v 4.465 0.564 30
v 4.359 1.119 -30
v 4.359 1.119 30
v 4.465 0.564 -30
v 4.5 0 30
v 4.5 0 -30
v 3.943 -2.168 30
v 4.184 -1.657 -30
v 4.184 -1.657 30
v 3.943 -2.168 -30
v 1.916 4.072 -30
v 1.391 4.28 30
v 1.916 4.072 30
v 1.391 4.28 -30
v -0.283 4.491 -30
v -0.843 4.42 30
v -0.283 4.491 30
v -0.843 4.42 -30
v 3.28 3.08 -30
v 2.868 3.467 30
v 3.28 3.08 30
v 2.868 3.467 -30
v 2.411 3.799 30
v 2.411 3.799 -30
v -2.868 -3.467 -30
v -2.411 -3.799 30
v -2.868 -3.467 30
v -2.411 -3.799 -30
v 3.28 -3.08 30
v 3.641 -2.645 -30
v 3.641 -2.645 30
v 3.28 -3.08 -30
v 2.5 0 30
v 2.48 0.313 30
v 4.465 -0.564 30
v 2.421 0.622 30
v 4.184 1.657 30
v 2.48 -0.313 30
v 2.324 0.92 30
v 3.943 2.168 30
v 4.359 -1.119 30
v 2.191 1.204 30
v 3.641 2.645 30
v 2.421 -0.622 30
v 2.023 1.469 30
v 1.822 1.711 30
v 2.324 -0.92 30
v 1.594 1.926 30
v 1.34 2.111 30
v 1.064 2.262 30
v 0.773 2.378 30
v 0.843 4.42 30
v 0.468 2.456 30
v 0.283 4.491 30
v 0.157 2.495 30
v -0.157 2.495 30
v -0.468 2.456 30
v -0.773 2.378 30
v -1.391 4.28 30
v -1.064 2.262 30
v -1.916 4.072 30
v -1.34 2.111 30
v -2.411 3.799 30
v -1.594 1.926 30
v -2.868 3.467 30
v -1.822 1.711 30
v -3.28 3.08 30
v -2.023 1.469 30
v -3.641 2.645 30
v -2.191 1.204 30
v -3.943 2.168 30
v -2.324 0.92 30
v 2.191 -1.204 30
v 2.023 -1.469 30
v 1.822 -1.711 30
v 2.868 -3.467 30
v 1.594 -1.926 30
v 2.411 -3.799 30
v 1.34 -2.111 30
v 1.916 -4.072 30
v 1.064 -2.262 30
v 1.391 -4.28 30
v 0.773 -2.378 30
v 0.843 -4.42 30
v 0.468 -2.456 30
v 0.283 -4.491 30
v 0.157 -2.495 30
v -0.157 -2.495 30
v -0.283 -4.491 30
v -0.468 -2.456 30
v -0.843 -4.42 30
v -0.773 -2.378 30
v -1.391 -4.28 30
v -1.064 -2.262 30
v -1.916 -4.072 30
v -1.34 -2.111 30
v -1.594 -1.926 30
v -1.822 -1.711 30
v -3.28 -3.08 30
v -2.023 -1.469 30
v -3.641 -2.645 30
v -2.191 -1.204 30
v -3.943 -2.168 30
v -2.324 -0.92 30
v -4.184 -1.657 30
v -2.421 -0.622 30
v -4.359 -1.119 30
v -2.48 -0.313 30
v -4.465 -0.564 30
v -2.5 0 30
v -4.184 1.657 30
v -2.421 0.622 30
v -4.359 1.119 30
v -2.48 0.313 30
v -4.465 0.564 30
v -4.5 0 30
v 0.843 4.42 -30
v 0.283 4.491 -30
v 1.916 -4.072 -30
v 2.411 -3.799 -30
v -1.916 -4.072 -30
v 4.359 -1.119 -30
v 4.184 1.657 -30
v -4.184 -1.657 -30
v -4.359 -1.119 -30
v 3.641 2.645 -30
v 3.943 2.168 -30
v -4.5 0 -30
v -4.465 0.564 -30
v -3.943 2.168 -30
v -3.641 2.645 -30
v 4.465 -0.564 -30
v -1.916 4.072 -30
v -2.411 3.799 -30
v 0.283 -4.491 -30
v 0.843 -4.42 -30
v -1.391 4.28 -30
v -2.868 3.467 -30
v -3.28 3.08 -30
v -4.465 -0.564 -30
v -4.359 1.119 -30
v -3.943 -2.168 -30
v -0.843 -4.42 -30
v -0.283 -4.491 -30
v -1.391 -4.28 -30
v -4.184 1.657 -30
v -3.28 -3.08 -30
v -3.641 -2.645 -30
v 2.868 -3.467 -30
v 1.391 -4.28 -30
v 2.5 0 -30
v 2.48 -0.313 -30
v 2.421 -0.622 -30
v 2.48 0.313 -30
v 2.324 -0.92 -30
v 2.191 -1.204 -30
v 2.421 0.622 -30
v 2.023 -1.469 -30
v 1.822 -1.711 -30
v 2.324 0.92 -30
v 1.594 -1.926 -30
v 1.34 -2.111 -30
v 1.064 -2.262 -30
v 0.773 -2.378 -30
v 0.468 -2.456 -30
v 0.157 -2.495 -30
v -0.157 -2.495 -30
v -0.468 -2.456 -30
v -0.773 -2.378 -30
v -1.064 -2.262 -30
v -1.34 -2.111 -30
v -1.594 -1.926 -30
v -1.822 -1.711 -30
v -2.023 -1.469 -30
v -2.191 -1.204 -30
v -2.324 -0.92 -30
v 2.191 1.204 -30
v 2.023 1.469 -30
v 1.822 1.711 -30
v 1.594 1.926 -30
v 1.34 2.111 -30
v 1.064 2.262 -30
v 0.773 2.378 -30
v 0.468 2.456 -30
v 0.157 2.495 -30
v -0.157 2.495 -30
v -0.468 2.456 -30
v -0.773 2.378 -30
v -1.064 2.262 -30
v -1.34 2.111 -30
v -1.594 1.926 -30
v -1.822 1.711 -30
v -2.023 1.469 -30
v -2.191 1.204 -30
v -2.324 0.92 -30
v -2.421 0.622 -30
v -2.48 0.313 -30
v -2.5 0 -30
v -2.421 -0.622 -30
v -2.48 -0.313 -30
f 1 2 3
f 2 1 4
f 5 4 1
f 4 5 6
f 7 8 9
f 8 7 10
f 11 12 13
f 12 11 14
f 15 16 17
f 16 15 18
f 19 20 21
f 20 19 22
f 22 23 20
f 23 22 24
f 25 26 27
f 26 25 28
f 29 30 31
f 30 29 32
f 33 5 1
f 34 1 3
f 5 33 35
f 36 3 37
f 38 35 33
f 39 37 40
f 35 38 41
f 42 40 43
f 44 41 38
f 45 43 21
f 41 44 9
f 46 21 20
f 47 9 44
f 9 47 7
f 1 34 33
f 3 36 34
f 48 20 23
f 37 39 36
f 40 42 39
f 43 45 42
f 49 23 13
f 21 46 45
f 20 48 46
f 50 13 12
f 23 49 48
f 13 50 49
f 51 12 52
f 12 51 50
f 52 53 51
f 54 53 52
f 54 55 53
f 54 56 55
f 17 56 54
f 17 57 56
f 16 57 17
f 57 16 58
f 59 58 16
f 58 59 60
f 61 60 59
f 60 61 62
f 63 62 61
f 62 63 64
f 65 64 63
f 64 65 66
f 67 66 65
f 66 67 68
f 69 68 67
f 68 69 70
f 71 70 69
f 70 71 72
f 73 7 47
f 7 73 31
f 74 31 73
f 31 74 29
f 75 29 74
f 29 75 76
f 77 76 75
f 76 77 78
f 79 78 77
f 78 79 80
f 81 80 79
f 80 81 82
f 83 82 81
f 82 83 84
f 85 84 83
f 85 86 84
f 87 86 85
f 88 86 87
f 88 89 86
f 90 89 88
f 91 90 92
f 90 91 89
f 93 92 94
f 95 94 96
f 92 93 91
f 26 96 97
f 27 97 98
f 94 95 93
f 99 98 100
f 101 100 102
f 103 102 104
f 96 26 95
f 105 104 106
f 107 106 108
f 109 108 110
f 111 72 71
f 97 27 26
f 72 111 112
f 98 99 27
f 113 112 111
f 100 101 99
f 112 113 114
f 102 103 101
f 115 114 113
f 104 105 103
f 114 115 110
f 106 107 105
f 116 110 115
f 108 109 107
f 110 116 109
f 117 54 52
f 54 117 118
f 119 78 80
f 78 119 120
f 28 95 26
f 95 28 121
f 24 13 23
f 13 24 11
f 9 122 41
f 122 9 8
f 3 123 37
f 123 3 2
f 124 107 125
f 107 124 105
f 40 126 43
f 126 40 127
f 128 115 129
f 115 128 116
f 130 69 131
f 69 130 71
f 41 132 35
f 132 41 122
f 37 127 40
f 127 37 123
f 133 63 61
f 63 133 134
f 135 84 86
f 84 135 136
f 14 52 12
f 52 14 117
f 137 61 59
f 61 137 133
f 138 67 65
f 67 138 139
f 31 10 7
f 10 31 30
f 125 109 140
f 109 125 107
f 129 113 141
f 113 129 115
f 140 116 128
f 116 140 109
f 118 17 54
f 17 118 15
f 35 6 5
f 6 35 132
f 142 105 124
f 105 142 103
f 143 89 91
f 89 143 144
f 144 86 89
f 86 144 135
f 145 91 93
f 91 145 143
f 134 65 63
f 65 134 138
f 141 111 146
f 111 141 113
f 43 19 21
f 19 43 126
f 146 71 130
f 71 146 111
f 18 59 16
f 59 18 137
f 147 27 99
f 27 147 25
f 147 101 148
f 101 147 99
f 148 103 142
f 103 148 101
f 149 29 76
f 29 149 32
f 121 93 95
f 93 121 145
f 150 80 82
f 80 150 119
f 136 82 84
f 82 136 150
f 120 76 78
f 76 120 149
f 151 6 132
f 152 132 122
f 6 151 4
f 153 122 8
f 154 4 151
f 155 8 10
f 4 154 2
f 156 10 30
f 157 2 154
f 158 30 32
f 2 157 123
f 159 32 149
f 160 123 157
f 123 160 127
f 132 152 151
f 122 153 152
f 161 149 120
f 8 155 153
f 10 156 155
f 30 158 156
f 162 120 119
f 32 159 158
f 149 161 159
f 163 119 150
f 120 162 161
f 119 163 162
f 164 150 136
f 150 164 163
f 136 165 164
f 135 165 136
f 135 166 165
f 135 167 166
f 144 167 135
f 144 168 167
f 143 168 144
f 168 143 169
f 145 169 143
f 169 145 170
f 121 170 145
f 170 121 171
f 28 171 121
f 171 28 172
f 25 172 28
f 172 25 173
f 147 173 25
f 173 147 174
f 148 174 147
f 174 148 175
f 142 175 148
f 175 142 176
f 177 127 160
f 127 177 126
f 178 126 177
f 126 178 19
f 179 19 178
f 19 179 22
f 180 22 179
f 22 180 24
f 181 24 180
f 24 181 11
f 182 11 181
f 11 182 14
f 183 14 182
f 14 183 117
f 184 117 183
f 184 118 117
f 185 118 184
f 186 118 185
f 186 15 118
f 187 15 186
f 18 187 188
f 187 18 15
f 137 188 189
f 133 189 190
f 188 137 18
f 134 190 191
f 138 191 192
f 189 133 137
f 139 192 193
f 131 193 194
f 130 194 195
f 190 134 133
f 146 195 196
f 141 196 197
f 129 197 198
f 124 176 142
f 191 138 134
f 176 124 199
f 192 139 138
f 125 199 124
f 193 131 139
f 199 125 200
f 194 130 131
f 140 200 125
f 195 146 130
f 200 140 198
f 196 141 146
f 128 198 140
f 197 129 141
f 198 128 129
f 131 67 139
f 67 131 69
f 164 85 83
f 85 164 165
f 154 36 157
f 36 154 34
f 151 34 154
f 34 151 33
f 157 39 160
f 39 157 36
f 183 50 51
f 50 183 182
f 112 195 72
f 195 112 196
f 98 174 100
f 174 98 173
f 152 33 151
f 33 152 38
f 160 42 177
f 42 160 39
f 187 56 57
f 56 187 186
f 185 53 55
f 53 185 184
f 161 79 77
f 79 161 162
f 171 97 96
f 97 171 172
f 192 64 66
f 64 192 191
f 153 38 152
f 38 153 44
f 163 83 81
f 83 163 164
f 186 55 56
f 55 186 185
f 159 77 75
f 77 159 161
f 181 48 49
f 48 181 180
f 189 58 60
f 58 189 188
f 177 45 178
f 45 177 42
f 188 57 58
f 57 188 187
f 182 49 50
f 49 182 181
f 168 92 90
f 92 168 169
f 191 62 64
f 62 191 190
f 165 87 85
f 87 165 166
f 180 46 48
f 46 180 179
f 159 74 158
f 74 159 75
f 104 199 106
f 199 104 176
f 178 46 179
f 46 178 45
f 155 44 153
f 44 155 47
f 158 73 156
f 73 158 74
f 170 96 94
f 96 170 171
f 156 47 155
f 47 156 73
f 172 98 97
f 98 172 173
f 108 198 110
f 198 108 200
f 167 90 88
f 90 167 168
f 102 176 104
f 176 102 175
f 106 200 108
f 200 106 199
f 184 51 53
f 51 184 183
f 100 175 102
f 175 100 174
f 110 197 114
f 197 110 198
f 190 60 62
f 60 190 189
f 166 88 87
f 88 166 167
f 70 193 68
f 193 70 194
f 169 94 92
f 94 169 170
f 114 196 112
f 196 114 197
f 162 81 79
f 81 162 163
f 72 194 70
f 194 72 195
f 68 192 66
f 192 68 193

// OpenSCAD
$fn = 50;


difference() {
	union() {
		translate(v = [0, 0, -30.0000000000]) {
			cylinder(h = 60, r = 4.5000000000);
		}
	}
	union() {
		translate(v = [0, 0, -100.0000000000]) {
			cylinder(h = 200, r = 2.5000000000);
		}
	}
}
